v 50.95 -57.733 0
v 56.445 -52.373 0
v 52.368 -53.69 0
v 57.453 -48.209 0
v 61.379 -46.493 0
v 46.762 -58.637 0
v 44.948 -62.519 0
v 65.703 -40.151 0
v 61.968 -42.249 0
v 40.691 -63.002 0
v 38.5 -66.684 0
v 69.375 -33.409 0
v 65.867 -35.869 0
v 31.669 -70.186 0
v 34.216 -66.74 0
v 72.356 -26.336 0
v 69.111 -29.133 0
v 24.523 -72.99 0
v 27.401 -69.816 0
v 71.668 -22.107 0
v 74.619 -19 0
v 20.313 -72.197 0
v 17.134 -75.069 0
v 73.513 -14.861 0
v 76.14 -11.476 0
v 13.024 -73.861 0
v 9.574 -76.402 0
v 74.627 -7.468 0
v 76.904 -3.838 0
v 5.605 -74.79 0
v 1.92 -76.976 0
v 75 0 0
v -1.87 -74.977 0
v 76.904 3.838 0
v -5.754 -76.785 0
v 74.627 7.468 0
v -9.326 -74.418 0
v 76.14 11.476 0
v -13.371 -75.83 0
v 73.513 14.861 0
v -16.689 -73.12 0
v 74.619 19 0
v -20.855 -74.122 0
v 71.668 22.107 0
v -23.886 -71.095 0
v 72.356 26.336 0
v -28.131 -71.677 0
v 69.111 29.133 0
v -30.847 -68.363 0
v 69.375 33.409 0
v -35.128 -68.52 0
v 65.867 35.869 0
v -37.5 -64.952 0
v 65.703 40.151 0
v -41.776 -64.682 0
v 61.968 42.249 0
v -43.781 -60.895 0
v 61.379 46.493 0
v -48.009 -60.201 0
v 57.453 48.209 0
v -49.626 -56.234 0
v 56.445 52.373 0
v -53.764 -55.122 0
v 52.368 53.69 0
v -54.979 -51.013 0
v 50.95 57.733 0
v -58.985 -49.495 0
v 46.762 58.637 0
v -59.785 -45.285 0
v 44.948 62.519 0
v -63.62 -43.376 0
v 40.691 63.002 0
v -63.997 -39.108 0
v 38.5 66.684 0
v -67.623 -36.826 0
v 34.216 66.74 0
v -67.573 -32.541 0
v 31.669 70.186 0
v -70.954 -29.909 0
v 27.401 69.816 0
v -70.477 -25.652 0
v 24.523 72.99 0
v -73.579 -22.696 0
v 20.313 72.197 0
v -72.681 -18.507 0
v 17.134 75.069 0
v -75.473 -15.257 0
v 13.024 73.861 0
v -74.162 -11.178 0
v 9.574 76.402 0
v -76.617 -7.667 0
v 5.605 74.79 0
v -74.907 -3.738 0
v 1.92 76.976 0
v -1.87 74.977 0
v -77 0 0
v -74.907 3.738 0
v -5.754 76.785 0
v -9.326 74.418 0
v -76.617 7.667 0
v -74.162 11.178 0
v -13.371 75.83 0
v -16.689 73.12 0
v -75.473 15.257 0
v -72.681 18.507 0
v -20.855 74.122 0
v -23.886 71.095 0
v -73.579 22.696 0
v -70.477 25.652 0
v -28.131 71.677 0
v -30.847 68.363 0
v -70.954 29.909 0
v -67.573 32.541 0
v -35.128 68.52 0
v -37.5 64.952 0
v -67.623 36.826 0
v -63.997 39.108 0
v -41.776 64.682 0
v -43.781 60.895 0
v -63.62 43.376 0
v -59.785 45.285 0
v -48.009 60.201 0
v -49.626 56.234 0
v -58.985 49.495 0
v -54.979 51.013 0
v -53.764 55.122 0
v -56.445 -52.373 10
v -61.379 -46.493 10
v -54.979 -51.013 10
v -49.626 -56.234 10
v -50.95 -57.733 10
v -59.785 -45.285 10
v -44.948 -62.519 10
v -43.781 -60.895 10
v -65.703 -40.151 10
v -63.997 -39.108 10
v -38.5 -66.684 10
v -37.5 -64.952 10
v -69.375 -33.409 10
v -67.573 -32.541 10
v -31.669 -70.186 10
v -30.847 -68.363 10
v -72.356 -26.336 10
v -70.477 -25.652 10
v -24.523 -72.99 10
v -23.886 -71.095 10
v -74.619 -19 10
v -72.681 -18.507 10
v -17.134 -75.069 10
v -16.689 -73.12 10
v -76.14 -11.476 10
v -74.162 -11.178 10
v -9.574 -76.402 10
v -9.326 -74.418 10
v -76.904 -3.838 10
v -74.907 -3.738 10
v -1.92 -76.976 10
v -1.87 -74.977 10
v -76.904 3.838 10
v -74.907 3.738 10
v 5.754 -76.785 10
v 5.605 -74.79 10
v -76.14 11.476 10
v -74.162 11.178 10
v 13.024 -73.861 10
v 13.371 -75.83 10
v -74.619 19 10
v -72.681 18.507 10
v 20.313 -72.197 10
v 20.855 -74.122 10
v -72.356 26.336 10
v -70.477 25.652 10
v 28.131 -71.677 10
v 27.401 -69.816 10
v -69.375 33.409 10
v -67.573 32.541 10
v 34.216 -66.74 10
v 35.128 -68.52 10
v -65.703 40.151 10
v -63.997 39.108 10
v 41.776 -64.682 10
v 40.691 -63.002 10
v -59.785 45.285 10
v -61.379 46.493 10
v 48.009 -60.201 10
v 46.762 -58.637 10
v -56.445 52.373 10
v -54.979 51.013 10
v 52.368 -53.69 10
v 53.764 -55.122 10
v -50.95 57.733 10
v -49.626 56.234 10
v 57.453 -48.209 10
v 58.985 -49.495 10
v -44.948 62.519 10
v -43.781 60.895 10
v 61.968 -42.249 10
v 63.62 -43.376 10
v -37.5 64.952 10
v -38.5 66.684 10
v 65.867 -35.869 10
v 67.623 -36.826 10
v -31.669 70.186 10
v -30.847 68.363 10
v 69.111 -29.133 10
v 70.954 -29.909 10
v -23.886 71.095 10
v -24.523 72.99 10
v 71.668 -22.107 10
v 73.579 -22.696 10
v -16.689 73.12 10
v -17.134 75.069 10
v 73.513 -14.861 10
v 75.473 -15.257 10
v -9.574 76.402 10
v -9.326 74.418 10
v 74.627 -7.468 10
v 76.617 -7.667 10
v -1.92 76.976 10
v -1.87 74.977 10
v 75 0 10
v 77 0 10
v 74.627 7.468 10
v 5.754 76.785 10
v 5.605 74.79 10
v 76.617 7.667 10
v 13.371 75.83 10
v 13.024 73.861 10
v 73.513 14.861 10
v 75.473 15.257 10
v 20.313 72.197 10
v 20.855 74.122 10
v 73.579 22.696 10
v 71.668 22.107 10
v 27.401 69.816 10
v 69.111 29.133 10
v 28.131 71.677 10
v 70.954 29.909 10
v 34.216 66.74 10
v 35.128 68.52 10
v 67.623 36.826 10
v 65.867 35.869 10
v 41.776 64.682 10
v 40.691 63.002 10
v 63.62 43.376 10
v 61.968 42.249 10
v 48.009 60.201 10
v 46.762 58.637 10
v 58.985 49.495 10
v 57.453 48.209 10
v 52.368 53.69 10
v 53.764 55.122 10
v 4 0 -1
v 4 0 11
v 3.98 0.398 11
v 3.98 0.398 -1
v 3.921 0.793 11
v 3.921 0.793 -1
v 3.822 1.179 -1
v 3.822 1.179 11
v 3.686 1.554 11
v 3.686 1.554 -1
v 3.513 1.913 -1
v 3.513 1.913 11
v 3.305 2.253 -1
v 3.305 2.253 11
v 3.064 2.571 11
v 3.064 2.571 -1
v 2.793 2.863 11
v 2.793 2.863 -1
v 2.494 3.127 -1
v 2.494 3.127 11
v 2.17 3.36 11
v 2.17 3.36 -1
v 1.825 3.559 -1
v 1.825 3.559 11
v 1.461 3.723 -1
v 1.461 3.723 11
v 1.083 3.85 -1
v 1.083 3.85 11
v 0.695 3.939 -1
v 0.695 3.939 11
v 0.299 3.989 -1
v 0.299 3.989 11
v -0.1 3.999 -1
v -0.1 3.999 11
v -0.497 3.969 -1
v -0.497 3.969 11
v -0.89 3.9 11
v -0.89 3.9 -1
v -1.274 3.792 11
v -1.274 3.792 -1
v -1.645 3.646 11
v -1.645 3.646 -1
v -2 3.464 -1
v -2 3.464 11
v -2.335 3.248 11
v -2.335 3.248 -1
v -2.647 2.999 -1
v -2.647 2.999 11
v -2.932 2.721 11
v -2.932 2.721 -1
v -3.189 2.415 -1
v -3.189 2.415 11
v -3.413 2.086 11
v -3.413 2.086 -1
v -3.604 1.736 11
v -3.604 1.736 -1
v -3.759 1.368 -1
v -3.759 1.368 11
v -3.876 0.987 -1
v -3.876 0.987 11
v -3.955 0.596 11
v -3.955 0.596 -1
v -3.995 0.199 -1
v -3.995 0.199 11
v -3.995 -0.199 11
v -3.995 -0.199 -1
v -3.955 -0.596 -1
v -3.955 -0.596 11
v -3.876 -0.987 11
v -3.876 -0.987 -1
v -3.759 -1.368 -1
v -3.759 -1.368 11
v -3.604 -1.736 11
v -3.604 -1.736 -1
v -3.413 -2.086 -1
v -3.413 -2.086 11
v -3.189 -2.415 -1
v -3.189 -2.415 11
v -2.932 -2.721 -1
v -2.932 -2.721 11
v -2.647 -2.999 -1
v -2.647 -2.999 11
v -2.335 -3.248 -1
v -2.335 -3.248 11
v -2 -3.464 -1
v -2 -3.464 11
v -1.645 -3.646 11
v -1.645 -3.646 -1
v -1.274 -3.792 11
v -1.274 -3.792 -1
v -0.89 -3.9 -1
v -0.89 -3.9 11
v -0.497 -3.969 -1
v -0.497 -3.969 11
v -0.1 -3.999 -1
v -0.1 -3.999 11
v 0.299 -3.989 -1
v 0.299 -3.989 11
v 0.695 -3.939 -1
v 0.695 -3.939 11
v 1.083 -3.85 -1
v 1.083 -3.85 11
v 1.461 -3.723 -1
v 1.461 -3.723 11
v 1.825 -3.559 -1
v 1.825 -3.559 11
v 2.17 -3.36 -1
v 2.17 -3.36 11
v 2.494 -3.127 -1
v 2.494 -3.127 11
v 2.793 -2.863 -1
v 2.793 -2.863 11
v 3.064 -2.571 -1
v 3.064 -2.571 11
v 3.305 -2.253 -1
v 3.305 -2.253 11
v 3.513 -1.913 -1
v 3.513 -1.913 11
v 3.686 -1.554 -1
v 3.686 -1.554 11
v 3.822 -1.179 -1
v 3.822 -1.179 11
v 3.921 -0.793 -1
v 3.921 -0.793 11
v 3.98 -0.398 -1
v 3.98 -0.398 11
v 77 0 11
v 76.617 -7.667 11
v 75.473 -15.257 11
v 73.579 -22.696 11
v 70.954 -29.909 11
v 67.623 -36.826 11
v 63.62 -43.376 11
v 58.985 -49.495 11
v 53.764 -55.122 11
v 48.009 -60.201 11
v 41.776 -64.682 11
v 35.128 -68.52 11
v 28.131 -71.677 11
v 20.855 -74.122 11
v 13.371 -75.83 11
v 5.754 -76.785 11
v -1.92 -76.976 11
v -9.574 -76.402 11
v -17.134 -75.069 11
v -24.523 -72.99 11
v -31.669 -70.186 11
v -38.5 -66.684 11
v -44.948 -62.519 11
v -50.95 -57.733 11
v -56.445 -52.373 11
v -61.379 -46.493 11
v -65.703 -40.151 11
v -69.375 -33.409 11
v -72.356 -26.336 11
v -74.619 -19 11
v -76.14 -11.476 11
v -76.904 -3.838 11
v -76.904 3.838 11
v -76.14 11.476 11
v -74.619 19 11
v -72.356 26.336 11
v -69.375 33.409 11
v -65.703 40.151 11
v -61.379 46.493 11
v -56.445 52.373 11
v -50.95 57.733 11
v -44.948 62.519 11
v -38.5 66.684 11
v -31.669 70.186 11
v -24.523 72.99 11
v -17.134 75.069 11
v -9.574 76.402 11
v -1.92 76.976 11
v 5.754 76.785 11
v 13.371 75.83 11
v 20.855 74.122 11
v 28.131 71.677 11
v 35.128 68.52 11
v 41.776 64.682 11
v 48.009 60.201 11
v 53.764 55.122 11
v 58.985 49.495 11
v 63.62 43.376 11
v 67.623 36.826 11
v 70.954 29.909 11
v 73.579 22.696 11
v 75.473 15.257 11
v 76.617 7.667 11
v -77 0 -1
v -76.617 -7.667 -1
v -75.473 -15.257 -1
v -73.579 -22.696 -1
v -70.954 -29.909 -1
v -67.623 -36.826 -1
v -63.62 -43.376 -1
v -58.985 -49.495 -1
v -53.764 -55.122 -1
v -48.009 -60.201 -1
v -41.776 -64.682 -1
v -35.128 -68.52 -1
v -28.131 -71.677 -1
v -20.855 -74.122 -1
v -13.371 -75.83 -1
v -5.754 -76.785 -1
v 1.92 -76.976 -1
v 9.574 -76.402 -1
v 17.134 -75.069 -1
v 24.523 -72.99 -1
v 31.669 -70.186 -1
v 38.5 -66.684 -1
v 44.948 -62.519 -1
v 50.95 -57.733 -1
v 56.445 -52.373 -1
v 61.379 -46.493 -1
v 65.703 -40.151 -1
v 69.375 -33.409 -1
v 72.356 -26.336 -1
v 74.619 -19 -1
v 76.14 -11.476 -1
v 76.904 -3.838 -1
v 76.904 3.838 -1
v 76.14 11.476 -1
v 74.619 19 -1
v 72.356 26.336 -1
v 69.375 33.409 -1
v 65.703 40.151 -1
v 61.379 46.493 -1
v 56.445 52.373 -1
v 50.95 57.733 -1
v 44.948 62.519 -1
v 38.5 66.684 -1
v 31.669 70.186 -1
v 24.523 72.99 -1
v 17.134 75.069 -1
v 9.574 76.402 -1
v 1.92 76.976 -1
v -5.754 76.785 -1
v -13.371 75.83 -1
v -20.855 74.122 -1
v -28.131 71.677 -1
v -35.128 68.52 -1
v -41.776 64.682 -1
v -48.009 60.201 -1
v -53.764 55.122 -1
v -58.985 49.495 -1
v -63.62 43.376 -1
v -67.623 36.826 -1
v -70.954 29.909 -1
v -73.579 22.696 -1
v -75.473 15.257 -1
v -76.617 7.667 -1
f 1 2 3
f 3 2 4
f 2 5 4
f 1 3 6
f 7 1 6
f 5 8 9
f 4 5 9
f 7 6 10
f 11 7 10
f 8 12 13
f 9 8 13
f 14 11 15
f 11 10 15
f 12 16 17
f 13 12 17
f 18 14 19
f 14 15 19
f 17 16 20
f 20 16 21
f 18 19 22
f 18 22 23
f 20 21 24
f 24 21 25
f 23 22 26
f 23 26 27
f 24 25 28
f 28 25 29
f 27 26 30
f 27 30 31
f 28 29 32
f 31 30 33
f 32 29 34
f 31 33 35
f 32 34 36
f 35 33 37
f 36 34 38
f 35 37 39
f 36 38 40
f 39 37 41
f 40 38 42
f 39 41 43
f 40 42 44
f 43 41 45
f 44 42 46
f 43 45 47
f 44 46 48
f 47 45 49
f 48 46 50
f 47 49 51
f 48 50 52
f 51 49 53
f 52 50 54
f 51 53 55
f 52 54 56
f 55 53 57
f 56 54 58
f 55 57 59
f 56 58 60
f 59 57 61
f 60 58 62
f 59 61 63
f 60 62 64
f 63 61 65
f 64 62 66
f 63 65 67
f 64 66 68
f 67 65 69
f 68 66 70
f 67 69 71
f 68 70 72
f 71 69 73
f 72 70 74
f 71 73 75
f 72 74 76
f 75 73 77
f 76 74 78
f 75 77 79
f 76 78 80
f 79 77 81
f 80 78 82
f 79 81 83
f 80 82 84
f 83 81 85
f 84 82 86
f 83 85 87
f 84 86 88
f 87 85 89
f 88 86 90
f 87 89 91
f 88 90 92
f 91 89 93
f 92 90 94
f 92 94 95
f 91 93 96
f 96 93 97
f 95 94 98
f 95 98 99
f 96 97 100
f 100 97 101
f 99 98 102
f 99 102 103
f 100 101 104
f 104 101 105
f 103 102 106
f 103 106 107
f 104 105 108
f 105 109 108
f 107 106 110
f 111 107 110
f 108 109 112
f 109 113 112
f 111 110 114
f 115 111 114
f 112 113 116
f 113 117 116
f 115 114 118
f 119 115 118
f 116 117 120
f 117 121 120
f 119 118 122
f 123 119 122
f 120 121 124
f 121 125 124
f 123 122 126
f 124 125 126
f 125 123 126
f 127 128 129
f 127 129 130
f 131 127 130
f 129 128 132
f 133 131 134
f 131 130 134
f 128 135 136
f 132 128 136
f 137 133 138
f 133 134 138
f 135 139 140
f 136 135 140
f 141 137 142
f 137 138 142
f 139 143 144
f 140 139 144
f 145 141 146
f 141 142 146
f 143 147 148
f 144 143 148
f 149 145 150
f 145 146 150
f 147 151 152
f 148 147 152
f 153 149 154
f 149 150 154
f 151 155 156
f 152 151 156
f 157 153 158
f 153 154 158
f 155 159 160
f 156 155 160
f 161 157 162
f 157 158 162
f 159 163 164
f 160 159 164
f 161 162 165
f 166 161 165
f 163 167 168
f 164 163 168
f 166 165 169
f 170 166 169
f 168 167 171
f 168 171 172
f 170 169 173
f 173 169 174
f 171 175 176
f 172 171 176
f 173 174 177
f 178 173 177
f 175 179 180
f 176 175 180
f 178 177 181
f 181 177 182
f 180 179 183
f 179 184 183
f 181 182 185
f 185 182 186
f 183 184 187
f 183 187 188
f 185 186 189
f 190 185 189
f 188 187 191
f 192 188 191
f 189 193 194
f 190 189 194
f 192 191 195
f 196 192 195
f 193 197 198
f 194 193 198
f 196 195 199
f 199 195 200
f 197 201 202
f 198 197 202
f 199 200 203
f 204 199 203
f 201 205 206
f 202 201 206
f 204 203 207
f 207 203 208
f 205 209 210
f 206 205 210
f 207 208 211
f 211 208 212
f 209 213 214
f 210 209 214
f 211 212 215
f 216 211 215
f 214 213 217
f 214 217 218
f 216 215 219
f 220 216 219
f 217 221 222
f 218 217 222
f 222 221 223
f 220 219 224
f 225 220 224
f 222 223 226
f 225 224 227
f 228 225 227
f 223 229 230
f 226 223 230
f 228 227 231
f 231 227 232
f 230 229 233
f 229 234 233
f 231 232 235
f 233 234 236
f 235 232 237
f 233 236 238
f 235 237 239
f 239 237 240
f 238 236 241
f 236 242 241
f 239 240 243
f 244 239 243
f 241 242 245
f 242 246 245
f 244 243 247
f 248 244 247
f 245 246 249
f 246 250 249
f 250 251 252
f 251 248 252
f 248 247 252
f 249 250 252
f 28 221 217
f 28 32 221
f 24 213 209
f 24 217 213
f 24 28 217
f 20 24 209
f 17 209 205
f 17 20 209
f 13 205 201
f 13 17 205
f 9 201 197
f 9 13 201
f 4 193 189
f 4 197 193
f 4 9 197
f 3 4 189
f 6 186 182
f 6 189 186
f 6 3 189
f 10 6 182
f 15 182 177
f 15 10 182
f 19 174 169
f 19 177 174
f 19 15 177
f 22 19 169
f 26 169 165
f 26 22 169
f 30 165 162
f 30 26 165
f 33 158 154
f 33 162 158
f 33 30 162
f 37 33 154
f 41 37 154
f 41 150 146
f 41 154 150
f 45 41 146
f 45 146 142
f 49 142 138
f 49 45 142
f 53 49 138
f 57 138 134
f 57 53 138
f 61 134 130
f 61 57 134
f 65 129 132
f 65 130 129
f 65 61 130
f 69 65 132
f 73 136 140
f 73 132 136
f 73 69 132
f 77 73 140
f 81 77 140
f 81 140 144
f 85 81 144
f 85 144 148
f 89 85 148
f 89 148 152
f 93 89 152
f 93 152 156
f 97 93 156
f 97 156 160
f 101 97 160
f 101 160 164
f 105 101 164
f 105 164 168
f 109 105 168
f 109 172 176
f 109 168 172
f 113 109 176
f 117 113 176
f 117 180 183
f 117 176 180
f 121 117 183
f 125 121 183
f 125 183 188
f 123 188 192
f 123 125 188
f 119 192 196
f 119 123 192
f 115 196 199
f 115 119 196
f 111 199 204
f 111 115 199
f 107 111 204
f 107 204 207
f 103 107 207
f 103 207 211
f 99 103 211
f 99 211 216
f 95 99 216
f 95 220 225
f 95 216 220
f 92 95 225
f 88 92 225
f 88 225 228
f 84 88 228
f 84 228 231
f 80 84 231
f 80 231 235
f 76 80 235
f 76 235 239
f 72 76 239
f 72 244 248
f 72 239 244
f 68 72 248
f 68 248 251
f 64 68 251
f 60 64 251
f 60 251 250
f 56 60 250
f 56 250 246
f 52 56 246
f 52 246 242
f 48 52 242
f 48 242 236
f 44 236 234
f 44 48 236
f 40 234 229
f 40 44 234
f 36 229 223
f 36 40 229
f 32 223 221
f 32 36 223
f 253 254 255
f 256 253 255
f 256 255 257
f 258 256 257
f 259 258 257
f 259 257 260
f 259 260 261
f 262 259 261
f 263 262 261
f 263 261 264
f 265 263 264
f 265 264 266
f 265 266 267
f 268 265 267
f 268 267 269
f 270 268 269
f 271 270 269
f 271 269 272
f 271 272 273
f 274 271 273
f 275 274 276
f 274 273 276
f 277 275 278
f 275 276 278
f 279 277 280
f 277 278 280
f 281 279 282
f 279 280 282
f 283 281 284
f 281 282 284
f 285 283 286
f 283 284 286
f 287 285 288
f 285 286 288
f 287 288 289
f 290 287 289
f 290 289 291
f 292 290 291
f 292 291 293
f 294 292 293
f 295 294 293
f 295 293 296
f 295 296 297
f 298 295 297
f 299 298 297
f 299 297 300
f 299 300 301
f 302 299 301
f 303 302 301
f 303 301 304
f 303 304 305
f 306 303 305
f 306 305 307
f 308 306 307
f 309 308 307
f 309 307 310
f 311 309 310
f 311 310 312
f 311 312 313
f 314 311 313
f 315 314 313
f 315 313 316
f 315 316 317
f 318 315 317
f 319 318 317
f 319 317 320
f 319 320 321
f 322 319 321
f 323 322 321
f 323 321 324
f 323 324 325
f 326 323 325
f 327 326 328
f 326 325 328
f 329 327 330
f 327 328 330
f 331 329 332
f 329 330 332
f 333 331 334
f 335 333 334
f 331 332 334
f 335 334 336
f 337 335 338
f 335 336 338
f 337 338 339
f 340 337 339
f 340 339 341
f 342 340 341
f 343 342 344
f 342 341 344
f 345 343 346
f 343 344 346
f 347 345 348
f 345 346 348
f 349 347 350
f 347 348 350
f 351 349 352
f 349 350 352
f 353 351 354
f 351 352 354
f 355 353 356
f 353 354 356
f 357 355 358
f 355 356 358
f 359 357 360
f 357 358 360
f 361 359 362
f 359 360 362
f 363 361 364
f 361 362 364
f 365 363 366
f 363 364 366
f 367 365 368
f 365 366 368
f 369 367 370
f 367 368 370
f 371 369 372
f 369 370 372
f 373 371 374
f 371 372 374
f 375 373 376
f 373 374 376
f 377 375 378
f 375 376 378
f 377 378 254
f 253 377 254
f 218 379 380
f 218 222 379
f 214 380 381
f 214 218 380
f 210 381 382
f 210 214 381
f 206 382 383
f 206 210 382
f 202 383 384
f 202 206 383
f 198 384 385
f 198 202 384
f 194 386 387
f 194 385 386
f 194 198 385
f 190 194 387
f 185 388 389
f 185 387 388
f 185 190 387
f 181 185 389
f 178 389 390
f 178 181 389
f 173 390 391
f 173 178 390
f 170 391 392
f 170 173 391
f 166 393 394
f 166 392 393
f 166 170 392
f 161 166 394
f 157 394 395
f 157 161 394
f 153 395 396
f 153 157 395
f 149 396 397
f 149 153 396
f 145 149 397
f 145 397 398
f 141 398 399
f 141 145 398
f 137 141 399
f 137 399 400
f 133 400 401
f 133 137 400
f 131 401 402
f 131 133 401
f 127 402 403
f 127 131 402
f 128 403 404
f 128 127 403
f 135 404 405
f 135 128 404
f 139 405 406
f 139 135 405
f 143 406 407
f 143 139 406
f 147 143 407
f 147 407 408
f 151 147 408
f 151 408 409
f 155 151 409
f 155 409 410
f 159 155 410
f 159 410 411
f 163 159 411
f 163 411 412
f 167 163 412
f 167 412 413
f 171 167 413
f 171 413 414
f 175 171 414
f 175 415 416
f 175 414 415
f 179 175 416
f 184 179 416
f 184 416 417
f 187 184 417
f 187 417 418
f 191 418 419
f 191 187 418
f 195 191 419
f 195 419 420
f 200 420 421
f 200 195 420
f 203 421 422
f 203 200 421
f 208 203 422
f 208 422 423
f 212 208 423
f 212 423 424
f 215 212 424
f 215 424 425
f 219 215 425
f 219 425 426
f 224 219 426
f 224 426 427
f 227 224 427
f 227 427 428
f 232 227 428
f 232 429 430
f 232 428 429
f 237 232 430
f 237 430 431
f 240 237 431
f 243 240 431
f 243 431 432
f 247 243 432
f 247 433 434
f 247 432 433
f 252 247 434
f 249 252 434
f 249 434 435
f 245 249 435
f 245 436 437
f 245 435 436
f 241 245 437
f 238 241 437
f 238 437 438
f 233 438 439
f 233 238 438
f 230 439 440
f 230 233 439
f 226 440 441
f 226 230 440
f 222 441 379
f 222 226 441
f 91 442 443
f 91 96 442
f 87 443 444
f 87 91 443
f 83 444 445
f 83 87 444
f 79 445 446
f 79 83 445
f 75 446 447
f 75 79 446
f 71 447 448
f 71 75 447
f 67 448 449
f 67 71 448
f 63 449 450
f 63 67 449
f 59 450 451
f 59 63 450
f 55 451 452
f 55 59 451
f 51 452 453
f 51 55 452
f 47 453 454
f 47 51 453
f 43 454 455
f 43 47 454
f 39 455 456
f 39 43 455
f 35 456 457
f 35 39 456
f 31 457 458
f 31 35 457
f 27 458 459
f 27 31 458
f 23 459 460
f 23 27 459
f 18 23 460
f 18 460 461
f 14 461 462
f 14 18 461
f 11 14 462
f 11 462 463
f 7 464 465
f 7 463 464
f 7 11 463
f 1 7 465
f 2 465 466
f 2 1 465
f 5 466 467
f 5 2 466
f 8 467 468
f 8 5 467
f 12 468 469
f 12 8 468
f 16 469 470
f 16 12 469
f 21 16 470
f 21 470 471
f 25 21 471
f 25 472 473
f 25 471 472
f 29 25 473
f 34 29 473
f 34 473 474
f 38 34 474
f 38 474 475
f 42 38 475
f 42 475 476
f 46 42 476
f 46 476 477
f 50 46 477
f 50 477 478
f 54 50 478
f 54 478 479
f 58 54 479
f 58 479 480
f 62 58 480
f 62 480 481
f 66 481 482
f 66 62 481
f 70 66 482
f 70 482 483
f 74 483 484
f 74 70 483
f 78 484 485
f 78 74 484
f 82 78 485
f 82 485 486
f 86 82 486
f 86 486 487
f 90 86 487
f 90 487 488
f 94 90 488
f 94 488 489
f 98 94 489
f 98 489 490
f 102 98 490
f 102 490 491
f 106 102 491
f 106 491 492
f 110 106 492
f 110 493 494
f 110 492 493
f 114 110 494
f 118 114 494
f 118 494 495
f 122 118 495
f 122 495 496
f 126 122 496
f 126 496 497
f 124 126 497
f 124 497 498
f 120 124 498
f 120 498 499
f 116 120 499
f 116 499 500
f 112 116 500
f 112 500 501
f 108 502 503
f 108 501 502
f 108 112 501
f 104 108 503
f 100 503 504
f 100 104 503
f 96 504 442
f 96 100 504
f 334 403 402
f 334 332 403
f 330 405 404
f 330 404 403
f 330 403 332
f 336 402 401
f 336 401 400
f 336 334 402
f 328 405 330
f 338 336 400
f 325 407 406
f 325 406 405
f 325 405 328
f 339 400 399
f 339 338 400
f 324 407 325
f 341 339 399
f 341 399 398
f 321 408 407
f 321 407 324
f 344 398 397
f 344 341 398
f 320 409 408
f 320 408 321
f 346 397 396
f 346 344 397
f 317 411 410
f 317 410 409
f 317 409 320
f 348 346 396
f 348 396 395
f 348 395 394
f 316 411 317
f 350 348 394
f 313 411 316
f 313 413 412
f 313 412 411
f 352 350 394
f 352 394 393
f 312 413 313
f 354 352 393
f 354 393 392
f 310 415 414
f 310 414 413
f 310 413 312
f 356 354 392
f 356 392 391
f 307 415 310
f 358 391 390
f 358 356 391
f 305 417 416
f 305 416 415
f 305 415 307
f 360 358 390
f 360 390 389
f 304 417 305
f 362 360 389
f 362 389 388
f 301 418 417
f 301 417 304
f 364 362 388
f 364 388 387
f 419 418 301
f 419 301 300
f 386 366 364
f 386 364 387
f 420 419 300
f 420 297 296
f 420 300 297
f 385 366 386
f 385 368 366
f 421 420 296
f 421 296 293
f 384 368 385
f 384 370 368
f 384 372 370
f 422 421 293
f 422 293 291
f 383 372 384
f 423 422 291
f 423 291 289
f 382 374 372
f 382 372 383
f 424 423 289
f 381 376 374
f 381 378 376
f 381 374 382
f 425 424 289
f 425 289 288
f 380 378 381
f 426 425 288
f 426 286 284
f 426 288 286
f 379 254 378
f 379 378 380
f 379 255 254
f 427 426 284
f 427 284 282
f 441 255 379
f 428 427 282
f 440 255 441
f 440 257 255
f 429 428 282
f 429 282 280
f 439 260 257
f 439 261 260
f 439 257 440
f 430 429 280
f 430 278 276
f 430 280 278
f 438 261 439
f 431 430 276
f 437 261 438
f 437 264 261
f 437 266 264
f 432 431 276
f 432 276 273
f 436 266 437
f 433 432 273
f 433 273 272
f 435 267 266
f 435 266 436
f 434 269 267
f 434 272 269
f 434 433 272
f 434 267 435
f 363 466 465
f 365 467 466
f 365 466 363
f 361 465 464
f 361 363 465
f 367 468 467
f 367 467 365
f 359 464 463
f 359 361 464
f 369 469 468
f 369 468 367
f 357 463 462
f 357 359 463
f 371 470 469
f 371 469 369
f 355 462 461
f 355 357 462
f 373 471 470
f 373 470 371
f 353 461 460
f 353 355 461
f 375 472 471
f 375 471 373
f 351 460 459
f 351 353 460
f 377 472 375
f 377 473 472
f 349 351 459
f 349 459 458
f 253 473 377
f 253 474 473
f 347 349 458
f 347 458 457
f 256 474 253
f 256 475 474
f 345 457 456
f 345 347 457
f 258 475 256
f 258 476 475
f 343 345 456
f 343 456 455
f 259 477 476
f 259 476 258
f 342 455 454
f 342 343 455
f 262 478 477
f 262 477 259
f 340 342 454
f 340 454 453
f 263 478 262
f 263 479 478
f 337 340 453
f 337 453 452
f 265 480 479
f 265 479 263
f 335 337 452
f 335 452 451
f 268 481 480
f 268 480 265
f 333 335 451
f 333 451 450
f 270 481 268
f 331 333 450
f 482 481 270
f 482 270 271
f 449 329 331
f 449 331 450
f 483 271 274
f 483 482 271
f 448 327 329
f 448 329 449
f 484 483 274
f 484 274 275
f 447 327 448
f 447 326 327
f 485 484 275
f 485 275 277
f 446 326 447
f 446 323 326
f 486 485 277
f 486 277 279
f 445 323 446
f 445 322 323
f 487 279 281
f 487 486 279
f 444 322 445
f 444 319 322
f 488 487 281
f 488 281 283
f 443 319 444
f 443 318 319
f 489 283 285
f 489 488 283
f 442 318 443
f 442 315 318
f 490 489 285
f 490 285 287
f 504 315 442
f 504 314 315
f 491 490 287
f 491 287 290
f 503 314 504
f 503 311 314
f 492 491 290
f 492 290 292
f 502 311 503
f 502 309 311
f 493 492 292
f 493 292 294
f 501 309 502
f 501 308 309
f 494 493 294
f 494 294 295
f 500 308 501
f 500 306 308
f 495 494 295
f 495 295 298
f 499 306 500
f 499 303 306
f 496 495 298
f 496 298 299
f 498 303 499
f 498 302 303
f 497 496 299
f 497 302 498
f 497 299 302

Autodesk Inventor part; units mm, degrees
ref_plane "YZ Plane" through (0, 0, 0) normal (1, 0, 0) x (0, 1, 0)
ref_plane "XZ Plane" through (0, 0, 0) normal (0, 1, 0) x (-1, 0, 0)
ref_plane "XY Plane" through (0, 0, 0) normal (0, 0, 1) x (1, 0, 0)
sketch "スケッチ1" plane through (0, 0, 0) normal (0, 0, 1) x (1, 0, 0)
  circle A0 centre (0, 0) radius 75
  dimension "d0" = 150
extrude "押し出し1" add sketch "スケッチ1" along normal blind 10
sketch "スケッチ2" plane through (0, 0, 10) normal (0, 0, 1) x (1, 0, 0)
  circle A0 centre (0, 0) radius 77
  dimension "d3" = 154
extrude "押し出し2" add sketch "スケッチ2" along normal blind 1
sketch "スケッチ3" plane through (0, 0, 0) normal (0, 0, -1) x (-1, 0, 0)
  circle A0 centre (0, 0) radius 77
  dimension "d6" = 154
extrude "押し出し3" add sketch "スケッチ3" along normal blind 1
sketch "スケッチ4" plane through (0, 0, 11) normal (0, 0, 1) x (1, 0, 0)
  circle A0 centre (0, 0) radius 4
  dimension "d9" = 8
extrude "押し出し4" cut sketch "スケッチ4" against normal blind 12
properties part number "射出_type0" material "アセタール樹脂、白"
